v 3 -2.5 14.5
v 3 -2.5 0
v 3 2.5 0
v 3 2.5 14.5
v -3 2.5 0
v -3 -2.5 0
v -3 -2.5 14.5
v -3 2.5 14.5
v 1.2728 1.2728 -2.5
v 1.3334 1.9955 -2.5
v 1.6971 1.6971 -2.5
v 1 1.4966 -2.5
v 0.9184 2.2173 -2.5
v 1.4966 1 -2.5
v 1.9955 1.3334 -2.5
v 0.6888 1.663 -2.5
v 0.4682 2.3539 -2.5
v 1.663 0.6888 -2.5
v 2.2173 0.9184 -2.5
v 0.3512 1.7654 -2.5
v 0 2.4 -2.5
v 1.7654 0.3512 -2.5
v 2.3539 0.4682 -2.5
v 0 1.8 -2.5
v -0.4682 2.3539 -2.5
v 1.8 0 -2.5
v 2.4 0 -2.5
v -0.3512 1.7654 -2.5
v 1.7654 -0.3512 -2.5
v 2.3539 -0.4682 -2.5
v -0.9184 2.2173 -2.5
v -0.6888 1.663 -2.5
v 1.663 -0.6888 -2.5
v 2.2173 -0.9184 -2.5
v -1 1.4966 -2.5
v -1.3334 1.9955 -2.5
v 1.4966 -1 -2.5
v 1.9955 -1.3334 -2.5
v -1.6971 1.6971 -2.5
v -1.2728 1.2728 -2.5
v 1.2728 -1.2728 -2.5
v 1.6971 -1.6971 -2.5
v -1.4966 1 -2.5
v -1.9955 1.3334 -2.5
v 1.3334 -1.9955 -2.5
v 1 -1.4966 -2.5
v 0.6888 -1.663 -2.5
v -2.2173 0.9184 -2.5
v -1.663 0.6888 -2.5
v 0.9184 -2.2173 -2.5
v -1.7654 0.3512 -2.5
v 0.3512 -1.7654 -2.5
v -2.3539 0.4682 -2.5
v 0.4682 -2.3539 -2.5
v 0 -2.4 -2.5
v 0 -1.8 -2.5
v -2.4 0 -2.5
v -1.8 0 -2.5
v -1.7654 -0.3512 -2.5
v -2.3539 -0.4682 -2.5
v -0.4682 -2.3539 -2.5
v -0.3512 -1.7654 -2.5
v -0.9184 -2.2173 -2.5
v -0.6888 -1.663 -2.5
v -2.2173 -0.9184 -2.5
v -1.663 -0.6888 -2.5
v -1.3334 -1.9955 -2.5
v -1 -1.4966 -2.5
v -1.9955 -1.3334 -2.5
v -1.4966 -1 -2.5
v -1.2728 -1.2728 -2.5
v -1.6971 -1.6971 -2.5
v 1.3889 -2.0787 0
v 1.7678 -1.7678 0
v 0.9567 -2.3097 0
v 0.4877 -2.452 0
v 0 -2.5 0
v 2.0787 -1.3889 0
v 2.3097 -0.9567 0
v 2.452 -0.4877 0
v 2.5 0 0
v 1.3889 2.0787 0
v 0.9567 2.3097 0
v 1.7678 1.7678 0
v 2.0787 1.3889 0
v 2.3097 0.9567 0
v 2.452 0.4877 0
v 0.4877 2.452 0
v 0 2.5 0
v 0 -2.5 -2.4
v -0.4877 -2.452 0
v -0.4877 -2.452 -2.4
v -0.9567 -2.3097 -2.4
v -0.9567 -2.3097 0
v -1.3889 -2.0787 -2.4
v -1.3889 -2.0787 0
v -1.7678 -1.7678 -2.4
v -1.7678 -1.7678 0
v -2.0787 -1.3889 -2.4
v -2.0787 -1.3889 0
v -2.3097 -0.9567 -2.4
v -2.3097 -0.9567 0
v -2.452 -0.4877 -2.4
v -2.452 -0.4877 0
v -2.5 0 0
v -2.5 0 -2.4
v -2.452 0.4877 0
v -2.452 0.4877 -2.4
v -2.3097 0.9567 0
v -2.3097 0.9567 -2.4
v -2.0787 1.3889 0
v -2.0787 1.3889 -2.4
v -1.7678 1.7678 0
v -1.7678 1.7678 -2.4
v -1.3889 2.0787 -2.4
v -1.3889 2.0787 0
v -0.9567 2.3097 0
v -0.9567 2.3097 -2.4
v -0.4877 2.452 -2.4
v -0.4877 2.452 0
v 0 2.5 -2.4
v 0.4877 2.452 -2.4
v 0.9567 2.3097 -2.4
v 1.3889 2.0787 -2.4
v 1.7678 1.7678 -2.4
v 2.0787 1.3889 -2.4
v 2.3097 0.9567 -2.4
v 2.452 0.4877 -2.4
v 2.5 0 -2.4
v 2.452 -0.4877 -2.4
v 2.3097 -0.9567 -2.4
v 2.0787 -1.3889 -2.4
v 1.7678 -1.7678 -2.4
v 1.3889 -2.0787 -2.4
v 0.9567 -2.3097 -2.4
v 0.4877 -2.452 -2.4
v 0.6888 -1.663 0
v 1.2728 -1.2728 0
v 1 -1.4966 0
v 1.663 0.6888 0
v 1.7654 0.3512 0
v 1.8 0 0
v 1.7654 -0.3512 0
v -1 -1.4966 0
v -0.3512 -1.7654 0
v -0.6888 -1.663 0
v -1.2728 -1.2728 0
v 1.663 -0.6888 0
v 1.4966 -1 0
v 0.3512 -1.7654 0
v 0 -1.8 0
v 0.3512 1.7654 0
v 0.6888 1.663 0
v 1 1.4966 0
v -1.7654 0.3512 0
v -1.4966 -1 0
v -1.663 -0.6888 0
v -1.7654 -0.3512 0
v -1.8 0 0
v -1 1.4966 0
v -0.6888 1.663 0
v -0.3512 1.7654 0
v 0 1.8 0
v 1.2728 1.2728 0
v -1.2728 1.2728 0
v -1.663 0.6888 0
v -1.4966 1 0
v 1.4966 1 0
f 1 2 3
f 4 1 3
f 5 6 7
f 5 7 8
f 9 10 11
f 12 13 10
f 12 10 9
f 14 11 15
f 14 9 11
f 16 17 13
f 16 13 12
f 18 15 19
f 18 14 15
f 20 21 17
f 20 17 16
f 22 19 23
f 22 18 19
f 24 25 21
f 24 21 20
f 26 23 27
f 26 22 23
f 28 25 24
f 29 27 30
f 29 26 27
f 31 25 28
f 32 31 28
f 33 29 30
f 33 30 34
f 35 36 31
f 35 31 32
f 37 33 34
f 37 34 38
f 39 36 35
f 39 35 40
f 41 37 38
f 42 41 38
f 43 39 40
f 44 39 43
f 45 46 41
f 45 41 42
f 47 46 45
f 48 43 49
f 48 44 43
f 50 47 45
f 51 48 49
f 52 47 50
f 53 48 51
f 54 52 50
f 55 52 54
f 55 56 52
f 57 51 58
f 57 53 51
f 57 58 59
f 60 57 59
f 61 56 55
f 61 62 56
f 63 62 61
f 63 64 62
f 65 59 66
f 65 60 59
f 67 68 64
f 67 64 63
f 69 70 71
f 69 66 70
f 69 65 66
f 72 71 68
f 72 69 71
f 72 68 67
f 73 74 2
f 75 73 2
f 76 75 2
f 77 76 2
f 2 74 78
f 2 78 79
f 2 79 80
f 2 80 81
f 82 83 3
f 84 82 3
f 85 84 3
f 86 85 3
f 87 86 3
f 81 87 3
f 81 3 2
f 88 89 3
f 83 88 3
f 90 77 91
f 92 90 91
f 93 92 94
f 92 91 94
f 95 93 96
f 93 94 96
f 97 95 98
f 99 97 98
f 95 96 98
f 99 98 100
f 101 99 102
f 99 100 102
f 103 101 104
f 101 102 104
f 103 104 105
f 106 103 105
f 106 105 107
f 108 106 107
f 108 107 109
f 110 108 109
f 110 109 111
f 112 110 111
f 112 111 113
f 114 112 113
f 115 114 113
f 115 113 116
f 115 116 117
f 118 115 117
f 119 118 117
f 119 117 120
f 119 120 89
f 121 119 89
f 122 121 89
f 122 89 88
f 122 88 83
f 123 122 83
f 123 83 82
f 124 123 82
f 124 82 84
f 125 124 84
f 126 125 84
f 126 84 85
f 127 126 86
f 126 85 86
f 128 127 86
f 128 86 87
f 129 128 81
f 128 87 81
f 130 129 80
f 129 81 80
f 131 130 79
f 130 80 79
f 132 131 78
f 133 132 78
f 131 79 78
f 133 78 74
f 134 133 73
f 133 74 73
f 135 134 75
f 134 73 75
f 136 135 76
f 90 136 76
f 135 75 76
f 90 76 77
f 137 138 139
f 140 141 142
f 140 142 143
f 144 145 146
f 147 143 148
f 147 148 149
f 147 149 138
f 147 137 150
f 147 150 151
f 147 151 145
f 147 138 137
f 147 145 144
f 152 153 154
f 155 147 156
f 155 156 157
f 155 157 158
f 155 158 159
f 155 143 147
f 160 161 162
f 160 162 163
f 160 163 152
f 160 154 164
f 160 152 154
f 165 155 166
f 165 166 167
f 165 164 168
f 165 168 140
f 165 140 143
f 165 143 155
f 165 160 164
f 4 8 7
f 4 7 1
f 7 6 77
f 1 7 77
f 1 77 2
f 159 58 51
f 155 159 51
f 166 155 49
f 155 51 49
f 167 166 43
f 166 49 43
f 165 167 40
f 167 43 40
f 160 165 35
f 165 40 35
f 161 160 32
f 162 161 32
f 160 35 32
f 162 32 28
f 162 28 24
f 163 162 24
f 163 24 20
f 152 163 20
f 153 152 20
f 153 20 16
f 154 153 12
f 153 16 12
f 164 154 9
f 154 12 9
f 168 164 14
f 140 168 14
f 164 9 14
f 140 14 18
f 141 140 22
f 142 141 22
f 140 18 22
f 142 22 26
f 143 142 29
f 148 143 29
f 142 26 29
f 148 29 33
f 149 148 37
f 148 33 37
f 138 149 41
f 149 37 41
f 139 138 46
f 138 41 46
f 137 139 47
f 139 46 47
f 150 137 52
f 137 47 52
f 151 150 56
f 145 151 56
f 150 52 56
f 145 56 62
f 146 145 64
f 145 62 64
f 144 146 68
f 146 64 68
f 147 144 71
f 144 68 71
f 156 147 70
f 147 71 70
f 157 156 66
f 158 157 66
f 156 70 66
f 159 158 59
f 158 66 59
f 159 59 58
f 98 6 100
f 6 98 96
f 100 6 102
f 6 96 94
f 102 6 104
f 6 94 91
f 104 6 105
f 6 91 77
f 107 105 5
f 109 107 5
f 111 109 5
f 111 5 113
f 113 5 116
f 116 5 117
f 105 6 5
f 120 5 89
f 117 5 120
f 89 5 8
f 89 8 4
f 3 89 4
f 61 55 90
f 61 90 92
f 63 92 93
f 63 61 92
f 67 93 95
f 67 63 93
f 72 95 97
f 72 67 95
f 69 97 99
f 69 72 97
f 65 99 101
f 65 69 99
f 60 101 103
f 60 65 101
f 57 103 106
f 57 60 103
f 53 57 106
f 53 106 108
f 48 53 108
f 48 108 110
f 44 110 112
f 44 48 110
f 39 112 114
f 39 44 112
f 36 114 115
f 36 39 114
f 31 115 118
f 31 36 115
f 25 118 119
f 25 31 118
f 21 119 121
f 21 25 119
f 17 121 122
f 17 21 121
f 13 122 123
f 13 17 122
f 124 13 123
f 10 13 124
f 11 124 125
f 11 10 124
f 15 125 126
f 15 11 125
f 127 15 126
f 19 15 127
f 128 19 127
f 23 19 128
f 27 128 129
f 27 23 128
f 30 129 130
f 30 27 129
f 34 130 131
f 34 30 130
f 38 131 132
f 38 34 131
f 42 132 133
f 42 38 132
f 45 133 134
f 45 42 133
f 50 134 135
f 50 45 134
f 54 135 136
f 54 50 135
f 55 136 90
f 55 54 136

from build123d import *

# Parameters (mm, degrees)
SKETCH1_W           = 6
SKETCH1_H           = 5
BOSS_EXTRUDE1_DEPTH = 14.5
SKETCH2_R           = 2.5
BOSS_EXTRUDE2_DEPTH = 2.5
SKETCH3_R           = 1.8
CUT_EXTRUDE1_DEPTH  = 2.5
CHAMFER1_SIZE       = 0.1


with BuildPart() as part:
    # Sketch1 → Boss-Extrude1 (new body)
    with BuildSketch(Plane.XY):
        Rectangle(SKETCH1_W, SKETCH1_H)
    extrude(amount=BOSS_EXTRUDE1_DEPTH)

    # Sketch2 → Boss-Extrude2 (add)
    with BuildSketch(Plane(origin=(0, 0, 0), x_dir=(-1, 0, 0), z_dir=(0, 0, -1))):
        with Locations(Location((0, 0, 0), (0, 0, 270))):
            Circle(SKETCH2_R)
    extrude(amount=BOSS_EXTRUDE2_DEPTH)

    # Sketch3 → Cut-Extrude1 (cut)
    with BuildSketch(Plane(origin=(0, 0, -2.5), x_dir=(-1, 0, 0), z_dir=(0, 0, -1))):
        Circle(SKETCH3_R)
    extrude(amount=-CUT_EXTRUDE1_DEPTH, mode=Mode.SUBTRACT)

    # Chamfer1
    chamfer1_edges = [part.edges().sort_by_distance(p)[0] for p in [
        (0, 2.5, -2.5),
    ]]
    chamfer(chamfer1_edges, length=CHAMFER1_SIZE)


solid = part.part
